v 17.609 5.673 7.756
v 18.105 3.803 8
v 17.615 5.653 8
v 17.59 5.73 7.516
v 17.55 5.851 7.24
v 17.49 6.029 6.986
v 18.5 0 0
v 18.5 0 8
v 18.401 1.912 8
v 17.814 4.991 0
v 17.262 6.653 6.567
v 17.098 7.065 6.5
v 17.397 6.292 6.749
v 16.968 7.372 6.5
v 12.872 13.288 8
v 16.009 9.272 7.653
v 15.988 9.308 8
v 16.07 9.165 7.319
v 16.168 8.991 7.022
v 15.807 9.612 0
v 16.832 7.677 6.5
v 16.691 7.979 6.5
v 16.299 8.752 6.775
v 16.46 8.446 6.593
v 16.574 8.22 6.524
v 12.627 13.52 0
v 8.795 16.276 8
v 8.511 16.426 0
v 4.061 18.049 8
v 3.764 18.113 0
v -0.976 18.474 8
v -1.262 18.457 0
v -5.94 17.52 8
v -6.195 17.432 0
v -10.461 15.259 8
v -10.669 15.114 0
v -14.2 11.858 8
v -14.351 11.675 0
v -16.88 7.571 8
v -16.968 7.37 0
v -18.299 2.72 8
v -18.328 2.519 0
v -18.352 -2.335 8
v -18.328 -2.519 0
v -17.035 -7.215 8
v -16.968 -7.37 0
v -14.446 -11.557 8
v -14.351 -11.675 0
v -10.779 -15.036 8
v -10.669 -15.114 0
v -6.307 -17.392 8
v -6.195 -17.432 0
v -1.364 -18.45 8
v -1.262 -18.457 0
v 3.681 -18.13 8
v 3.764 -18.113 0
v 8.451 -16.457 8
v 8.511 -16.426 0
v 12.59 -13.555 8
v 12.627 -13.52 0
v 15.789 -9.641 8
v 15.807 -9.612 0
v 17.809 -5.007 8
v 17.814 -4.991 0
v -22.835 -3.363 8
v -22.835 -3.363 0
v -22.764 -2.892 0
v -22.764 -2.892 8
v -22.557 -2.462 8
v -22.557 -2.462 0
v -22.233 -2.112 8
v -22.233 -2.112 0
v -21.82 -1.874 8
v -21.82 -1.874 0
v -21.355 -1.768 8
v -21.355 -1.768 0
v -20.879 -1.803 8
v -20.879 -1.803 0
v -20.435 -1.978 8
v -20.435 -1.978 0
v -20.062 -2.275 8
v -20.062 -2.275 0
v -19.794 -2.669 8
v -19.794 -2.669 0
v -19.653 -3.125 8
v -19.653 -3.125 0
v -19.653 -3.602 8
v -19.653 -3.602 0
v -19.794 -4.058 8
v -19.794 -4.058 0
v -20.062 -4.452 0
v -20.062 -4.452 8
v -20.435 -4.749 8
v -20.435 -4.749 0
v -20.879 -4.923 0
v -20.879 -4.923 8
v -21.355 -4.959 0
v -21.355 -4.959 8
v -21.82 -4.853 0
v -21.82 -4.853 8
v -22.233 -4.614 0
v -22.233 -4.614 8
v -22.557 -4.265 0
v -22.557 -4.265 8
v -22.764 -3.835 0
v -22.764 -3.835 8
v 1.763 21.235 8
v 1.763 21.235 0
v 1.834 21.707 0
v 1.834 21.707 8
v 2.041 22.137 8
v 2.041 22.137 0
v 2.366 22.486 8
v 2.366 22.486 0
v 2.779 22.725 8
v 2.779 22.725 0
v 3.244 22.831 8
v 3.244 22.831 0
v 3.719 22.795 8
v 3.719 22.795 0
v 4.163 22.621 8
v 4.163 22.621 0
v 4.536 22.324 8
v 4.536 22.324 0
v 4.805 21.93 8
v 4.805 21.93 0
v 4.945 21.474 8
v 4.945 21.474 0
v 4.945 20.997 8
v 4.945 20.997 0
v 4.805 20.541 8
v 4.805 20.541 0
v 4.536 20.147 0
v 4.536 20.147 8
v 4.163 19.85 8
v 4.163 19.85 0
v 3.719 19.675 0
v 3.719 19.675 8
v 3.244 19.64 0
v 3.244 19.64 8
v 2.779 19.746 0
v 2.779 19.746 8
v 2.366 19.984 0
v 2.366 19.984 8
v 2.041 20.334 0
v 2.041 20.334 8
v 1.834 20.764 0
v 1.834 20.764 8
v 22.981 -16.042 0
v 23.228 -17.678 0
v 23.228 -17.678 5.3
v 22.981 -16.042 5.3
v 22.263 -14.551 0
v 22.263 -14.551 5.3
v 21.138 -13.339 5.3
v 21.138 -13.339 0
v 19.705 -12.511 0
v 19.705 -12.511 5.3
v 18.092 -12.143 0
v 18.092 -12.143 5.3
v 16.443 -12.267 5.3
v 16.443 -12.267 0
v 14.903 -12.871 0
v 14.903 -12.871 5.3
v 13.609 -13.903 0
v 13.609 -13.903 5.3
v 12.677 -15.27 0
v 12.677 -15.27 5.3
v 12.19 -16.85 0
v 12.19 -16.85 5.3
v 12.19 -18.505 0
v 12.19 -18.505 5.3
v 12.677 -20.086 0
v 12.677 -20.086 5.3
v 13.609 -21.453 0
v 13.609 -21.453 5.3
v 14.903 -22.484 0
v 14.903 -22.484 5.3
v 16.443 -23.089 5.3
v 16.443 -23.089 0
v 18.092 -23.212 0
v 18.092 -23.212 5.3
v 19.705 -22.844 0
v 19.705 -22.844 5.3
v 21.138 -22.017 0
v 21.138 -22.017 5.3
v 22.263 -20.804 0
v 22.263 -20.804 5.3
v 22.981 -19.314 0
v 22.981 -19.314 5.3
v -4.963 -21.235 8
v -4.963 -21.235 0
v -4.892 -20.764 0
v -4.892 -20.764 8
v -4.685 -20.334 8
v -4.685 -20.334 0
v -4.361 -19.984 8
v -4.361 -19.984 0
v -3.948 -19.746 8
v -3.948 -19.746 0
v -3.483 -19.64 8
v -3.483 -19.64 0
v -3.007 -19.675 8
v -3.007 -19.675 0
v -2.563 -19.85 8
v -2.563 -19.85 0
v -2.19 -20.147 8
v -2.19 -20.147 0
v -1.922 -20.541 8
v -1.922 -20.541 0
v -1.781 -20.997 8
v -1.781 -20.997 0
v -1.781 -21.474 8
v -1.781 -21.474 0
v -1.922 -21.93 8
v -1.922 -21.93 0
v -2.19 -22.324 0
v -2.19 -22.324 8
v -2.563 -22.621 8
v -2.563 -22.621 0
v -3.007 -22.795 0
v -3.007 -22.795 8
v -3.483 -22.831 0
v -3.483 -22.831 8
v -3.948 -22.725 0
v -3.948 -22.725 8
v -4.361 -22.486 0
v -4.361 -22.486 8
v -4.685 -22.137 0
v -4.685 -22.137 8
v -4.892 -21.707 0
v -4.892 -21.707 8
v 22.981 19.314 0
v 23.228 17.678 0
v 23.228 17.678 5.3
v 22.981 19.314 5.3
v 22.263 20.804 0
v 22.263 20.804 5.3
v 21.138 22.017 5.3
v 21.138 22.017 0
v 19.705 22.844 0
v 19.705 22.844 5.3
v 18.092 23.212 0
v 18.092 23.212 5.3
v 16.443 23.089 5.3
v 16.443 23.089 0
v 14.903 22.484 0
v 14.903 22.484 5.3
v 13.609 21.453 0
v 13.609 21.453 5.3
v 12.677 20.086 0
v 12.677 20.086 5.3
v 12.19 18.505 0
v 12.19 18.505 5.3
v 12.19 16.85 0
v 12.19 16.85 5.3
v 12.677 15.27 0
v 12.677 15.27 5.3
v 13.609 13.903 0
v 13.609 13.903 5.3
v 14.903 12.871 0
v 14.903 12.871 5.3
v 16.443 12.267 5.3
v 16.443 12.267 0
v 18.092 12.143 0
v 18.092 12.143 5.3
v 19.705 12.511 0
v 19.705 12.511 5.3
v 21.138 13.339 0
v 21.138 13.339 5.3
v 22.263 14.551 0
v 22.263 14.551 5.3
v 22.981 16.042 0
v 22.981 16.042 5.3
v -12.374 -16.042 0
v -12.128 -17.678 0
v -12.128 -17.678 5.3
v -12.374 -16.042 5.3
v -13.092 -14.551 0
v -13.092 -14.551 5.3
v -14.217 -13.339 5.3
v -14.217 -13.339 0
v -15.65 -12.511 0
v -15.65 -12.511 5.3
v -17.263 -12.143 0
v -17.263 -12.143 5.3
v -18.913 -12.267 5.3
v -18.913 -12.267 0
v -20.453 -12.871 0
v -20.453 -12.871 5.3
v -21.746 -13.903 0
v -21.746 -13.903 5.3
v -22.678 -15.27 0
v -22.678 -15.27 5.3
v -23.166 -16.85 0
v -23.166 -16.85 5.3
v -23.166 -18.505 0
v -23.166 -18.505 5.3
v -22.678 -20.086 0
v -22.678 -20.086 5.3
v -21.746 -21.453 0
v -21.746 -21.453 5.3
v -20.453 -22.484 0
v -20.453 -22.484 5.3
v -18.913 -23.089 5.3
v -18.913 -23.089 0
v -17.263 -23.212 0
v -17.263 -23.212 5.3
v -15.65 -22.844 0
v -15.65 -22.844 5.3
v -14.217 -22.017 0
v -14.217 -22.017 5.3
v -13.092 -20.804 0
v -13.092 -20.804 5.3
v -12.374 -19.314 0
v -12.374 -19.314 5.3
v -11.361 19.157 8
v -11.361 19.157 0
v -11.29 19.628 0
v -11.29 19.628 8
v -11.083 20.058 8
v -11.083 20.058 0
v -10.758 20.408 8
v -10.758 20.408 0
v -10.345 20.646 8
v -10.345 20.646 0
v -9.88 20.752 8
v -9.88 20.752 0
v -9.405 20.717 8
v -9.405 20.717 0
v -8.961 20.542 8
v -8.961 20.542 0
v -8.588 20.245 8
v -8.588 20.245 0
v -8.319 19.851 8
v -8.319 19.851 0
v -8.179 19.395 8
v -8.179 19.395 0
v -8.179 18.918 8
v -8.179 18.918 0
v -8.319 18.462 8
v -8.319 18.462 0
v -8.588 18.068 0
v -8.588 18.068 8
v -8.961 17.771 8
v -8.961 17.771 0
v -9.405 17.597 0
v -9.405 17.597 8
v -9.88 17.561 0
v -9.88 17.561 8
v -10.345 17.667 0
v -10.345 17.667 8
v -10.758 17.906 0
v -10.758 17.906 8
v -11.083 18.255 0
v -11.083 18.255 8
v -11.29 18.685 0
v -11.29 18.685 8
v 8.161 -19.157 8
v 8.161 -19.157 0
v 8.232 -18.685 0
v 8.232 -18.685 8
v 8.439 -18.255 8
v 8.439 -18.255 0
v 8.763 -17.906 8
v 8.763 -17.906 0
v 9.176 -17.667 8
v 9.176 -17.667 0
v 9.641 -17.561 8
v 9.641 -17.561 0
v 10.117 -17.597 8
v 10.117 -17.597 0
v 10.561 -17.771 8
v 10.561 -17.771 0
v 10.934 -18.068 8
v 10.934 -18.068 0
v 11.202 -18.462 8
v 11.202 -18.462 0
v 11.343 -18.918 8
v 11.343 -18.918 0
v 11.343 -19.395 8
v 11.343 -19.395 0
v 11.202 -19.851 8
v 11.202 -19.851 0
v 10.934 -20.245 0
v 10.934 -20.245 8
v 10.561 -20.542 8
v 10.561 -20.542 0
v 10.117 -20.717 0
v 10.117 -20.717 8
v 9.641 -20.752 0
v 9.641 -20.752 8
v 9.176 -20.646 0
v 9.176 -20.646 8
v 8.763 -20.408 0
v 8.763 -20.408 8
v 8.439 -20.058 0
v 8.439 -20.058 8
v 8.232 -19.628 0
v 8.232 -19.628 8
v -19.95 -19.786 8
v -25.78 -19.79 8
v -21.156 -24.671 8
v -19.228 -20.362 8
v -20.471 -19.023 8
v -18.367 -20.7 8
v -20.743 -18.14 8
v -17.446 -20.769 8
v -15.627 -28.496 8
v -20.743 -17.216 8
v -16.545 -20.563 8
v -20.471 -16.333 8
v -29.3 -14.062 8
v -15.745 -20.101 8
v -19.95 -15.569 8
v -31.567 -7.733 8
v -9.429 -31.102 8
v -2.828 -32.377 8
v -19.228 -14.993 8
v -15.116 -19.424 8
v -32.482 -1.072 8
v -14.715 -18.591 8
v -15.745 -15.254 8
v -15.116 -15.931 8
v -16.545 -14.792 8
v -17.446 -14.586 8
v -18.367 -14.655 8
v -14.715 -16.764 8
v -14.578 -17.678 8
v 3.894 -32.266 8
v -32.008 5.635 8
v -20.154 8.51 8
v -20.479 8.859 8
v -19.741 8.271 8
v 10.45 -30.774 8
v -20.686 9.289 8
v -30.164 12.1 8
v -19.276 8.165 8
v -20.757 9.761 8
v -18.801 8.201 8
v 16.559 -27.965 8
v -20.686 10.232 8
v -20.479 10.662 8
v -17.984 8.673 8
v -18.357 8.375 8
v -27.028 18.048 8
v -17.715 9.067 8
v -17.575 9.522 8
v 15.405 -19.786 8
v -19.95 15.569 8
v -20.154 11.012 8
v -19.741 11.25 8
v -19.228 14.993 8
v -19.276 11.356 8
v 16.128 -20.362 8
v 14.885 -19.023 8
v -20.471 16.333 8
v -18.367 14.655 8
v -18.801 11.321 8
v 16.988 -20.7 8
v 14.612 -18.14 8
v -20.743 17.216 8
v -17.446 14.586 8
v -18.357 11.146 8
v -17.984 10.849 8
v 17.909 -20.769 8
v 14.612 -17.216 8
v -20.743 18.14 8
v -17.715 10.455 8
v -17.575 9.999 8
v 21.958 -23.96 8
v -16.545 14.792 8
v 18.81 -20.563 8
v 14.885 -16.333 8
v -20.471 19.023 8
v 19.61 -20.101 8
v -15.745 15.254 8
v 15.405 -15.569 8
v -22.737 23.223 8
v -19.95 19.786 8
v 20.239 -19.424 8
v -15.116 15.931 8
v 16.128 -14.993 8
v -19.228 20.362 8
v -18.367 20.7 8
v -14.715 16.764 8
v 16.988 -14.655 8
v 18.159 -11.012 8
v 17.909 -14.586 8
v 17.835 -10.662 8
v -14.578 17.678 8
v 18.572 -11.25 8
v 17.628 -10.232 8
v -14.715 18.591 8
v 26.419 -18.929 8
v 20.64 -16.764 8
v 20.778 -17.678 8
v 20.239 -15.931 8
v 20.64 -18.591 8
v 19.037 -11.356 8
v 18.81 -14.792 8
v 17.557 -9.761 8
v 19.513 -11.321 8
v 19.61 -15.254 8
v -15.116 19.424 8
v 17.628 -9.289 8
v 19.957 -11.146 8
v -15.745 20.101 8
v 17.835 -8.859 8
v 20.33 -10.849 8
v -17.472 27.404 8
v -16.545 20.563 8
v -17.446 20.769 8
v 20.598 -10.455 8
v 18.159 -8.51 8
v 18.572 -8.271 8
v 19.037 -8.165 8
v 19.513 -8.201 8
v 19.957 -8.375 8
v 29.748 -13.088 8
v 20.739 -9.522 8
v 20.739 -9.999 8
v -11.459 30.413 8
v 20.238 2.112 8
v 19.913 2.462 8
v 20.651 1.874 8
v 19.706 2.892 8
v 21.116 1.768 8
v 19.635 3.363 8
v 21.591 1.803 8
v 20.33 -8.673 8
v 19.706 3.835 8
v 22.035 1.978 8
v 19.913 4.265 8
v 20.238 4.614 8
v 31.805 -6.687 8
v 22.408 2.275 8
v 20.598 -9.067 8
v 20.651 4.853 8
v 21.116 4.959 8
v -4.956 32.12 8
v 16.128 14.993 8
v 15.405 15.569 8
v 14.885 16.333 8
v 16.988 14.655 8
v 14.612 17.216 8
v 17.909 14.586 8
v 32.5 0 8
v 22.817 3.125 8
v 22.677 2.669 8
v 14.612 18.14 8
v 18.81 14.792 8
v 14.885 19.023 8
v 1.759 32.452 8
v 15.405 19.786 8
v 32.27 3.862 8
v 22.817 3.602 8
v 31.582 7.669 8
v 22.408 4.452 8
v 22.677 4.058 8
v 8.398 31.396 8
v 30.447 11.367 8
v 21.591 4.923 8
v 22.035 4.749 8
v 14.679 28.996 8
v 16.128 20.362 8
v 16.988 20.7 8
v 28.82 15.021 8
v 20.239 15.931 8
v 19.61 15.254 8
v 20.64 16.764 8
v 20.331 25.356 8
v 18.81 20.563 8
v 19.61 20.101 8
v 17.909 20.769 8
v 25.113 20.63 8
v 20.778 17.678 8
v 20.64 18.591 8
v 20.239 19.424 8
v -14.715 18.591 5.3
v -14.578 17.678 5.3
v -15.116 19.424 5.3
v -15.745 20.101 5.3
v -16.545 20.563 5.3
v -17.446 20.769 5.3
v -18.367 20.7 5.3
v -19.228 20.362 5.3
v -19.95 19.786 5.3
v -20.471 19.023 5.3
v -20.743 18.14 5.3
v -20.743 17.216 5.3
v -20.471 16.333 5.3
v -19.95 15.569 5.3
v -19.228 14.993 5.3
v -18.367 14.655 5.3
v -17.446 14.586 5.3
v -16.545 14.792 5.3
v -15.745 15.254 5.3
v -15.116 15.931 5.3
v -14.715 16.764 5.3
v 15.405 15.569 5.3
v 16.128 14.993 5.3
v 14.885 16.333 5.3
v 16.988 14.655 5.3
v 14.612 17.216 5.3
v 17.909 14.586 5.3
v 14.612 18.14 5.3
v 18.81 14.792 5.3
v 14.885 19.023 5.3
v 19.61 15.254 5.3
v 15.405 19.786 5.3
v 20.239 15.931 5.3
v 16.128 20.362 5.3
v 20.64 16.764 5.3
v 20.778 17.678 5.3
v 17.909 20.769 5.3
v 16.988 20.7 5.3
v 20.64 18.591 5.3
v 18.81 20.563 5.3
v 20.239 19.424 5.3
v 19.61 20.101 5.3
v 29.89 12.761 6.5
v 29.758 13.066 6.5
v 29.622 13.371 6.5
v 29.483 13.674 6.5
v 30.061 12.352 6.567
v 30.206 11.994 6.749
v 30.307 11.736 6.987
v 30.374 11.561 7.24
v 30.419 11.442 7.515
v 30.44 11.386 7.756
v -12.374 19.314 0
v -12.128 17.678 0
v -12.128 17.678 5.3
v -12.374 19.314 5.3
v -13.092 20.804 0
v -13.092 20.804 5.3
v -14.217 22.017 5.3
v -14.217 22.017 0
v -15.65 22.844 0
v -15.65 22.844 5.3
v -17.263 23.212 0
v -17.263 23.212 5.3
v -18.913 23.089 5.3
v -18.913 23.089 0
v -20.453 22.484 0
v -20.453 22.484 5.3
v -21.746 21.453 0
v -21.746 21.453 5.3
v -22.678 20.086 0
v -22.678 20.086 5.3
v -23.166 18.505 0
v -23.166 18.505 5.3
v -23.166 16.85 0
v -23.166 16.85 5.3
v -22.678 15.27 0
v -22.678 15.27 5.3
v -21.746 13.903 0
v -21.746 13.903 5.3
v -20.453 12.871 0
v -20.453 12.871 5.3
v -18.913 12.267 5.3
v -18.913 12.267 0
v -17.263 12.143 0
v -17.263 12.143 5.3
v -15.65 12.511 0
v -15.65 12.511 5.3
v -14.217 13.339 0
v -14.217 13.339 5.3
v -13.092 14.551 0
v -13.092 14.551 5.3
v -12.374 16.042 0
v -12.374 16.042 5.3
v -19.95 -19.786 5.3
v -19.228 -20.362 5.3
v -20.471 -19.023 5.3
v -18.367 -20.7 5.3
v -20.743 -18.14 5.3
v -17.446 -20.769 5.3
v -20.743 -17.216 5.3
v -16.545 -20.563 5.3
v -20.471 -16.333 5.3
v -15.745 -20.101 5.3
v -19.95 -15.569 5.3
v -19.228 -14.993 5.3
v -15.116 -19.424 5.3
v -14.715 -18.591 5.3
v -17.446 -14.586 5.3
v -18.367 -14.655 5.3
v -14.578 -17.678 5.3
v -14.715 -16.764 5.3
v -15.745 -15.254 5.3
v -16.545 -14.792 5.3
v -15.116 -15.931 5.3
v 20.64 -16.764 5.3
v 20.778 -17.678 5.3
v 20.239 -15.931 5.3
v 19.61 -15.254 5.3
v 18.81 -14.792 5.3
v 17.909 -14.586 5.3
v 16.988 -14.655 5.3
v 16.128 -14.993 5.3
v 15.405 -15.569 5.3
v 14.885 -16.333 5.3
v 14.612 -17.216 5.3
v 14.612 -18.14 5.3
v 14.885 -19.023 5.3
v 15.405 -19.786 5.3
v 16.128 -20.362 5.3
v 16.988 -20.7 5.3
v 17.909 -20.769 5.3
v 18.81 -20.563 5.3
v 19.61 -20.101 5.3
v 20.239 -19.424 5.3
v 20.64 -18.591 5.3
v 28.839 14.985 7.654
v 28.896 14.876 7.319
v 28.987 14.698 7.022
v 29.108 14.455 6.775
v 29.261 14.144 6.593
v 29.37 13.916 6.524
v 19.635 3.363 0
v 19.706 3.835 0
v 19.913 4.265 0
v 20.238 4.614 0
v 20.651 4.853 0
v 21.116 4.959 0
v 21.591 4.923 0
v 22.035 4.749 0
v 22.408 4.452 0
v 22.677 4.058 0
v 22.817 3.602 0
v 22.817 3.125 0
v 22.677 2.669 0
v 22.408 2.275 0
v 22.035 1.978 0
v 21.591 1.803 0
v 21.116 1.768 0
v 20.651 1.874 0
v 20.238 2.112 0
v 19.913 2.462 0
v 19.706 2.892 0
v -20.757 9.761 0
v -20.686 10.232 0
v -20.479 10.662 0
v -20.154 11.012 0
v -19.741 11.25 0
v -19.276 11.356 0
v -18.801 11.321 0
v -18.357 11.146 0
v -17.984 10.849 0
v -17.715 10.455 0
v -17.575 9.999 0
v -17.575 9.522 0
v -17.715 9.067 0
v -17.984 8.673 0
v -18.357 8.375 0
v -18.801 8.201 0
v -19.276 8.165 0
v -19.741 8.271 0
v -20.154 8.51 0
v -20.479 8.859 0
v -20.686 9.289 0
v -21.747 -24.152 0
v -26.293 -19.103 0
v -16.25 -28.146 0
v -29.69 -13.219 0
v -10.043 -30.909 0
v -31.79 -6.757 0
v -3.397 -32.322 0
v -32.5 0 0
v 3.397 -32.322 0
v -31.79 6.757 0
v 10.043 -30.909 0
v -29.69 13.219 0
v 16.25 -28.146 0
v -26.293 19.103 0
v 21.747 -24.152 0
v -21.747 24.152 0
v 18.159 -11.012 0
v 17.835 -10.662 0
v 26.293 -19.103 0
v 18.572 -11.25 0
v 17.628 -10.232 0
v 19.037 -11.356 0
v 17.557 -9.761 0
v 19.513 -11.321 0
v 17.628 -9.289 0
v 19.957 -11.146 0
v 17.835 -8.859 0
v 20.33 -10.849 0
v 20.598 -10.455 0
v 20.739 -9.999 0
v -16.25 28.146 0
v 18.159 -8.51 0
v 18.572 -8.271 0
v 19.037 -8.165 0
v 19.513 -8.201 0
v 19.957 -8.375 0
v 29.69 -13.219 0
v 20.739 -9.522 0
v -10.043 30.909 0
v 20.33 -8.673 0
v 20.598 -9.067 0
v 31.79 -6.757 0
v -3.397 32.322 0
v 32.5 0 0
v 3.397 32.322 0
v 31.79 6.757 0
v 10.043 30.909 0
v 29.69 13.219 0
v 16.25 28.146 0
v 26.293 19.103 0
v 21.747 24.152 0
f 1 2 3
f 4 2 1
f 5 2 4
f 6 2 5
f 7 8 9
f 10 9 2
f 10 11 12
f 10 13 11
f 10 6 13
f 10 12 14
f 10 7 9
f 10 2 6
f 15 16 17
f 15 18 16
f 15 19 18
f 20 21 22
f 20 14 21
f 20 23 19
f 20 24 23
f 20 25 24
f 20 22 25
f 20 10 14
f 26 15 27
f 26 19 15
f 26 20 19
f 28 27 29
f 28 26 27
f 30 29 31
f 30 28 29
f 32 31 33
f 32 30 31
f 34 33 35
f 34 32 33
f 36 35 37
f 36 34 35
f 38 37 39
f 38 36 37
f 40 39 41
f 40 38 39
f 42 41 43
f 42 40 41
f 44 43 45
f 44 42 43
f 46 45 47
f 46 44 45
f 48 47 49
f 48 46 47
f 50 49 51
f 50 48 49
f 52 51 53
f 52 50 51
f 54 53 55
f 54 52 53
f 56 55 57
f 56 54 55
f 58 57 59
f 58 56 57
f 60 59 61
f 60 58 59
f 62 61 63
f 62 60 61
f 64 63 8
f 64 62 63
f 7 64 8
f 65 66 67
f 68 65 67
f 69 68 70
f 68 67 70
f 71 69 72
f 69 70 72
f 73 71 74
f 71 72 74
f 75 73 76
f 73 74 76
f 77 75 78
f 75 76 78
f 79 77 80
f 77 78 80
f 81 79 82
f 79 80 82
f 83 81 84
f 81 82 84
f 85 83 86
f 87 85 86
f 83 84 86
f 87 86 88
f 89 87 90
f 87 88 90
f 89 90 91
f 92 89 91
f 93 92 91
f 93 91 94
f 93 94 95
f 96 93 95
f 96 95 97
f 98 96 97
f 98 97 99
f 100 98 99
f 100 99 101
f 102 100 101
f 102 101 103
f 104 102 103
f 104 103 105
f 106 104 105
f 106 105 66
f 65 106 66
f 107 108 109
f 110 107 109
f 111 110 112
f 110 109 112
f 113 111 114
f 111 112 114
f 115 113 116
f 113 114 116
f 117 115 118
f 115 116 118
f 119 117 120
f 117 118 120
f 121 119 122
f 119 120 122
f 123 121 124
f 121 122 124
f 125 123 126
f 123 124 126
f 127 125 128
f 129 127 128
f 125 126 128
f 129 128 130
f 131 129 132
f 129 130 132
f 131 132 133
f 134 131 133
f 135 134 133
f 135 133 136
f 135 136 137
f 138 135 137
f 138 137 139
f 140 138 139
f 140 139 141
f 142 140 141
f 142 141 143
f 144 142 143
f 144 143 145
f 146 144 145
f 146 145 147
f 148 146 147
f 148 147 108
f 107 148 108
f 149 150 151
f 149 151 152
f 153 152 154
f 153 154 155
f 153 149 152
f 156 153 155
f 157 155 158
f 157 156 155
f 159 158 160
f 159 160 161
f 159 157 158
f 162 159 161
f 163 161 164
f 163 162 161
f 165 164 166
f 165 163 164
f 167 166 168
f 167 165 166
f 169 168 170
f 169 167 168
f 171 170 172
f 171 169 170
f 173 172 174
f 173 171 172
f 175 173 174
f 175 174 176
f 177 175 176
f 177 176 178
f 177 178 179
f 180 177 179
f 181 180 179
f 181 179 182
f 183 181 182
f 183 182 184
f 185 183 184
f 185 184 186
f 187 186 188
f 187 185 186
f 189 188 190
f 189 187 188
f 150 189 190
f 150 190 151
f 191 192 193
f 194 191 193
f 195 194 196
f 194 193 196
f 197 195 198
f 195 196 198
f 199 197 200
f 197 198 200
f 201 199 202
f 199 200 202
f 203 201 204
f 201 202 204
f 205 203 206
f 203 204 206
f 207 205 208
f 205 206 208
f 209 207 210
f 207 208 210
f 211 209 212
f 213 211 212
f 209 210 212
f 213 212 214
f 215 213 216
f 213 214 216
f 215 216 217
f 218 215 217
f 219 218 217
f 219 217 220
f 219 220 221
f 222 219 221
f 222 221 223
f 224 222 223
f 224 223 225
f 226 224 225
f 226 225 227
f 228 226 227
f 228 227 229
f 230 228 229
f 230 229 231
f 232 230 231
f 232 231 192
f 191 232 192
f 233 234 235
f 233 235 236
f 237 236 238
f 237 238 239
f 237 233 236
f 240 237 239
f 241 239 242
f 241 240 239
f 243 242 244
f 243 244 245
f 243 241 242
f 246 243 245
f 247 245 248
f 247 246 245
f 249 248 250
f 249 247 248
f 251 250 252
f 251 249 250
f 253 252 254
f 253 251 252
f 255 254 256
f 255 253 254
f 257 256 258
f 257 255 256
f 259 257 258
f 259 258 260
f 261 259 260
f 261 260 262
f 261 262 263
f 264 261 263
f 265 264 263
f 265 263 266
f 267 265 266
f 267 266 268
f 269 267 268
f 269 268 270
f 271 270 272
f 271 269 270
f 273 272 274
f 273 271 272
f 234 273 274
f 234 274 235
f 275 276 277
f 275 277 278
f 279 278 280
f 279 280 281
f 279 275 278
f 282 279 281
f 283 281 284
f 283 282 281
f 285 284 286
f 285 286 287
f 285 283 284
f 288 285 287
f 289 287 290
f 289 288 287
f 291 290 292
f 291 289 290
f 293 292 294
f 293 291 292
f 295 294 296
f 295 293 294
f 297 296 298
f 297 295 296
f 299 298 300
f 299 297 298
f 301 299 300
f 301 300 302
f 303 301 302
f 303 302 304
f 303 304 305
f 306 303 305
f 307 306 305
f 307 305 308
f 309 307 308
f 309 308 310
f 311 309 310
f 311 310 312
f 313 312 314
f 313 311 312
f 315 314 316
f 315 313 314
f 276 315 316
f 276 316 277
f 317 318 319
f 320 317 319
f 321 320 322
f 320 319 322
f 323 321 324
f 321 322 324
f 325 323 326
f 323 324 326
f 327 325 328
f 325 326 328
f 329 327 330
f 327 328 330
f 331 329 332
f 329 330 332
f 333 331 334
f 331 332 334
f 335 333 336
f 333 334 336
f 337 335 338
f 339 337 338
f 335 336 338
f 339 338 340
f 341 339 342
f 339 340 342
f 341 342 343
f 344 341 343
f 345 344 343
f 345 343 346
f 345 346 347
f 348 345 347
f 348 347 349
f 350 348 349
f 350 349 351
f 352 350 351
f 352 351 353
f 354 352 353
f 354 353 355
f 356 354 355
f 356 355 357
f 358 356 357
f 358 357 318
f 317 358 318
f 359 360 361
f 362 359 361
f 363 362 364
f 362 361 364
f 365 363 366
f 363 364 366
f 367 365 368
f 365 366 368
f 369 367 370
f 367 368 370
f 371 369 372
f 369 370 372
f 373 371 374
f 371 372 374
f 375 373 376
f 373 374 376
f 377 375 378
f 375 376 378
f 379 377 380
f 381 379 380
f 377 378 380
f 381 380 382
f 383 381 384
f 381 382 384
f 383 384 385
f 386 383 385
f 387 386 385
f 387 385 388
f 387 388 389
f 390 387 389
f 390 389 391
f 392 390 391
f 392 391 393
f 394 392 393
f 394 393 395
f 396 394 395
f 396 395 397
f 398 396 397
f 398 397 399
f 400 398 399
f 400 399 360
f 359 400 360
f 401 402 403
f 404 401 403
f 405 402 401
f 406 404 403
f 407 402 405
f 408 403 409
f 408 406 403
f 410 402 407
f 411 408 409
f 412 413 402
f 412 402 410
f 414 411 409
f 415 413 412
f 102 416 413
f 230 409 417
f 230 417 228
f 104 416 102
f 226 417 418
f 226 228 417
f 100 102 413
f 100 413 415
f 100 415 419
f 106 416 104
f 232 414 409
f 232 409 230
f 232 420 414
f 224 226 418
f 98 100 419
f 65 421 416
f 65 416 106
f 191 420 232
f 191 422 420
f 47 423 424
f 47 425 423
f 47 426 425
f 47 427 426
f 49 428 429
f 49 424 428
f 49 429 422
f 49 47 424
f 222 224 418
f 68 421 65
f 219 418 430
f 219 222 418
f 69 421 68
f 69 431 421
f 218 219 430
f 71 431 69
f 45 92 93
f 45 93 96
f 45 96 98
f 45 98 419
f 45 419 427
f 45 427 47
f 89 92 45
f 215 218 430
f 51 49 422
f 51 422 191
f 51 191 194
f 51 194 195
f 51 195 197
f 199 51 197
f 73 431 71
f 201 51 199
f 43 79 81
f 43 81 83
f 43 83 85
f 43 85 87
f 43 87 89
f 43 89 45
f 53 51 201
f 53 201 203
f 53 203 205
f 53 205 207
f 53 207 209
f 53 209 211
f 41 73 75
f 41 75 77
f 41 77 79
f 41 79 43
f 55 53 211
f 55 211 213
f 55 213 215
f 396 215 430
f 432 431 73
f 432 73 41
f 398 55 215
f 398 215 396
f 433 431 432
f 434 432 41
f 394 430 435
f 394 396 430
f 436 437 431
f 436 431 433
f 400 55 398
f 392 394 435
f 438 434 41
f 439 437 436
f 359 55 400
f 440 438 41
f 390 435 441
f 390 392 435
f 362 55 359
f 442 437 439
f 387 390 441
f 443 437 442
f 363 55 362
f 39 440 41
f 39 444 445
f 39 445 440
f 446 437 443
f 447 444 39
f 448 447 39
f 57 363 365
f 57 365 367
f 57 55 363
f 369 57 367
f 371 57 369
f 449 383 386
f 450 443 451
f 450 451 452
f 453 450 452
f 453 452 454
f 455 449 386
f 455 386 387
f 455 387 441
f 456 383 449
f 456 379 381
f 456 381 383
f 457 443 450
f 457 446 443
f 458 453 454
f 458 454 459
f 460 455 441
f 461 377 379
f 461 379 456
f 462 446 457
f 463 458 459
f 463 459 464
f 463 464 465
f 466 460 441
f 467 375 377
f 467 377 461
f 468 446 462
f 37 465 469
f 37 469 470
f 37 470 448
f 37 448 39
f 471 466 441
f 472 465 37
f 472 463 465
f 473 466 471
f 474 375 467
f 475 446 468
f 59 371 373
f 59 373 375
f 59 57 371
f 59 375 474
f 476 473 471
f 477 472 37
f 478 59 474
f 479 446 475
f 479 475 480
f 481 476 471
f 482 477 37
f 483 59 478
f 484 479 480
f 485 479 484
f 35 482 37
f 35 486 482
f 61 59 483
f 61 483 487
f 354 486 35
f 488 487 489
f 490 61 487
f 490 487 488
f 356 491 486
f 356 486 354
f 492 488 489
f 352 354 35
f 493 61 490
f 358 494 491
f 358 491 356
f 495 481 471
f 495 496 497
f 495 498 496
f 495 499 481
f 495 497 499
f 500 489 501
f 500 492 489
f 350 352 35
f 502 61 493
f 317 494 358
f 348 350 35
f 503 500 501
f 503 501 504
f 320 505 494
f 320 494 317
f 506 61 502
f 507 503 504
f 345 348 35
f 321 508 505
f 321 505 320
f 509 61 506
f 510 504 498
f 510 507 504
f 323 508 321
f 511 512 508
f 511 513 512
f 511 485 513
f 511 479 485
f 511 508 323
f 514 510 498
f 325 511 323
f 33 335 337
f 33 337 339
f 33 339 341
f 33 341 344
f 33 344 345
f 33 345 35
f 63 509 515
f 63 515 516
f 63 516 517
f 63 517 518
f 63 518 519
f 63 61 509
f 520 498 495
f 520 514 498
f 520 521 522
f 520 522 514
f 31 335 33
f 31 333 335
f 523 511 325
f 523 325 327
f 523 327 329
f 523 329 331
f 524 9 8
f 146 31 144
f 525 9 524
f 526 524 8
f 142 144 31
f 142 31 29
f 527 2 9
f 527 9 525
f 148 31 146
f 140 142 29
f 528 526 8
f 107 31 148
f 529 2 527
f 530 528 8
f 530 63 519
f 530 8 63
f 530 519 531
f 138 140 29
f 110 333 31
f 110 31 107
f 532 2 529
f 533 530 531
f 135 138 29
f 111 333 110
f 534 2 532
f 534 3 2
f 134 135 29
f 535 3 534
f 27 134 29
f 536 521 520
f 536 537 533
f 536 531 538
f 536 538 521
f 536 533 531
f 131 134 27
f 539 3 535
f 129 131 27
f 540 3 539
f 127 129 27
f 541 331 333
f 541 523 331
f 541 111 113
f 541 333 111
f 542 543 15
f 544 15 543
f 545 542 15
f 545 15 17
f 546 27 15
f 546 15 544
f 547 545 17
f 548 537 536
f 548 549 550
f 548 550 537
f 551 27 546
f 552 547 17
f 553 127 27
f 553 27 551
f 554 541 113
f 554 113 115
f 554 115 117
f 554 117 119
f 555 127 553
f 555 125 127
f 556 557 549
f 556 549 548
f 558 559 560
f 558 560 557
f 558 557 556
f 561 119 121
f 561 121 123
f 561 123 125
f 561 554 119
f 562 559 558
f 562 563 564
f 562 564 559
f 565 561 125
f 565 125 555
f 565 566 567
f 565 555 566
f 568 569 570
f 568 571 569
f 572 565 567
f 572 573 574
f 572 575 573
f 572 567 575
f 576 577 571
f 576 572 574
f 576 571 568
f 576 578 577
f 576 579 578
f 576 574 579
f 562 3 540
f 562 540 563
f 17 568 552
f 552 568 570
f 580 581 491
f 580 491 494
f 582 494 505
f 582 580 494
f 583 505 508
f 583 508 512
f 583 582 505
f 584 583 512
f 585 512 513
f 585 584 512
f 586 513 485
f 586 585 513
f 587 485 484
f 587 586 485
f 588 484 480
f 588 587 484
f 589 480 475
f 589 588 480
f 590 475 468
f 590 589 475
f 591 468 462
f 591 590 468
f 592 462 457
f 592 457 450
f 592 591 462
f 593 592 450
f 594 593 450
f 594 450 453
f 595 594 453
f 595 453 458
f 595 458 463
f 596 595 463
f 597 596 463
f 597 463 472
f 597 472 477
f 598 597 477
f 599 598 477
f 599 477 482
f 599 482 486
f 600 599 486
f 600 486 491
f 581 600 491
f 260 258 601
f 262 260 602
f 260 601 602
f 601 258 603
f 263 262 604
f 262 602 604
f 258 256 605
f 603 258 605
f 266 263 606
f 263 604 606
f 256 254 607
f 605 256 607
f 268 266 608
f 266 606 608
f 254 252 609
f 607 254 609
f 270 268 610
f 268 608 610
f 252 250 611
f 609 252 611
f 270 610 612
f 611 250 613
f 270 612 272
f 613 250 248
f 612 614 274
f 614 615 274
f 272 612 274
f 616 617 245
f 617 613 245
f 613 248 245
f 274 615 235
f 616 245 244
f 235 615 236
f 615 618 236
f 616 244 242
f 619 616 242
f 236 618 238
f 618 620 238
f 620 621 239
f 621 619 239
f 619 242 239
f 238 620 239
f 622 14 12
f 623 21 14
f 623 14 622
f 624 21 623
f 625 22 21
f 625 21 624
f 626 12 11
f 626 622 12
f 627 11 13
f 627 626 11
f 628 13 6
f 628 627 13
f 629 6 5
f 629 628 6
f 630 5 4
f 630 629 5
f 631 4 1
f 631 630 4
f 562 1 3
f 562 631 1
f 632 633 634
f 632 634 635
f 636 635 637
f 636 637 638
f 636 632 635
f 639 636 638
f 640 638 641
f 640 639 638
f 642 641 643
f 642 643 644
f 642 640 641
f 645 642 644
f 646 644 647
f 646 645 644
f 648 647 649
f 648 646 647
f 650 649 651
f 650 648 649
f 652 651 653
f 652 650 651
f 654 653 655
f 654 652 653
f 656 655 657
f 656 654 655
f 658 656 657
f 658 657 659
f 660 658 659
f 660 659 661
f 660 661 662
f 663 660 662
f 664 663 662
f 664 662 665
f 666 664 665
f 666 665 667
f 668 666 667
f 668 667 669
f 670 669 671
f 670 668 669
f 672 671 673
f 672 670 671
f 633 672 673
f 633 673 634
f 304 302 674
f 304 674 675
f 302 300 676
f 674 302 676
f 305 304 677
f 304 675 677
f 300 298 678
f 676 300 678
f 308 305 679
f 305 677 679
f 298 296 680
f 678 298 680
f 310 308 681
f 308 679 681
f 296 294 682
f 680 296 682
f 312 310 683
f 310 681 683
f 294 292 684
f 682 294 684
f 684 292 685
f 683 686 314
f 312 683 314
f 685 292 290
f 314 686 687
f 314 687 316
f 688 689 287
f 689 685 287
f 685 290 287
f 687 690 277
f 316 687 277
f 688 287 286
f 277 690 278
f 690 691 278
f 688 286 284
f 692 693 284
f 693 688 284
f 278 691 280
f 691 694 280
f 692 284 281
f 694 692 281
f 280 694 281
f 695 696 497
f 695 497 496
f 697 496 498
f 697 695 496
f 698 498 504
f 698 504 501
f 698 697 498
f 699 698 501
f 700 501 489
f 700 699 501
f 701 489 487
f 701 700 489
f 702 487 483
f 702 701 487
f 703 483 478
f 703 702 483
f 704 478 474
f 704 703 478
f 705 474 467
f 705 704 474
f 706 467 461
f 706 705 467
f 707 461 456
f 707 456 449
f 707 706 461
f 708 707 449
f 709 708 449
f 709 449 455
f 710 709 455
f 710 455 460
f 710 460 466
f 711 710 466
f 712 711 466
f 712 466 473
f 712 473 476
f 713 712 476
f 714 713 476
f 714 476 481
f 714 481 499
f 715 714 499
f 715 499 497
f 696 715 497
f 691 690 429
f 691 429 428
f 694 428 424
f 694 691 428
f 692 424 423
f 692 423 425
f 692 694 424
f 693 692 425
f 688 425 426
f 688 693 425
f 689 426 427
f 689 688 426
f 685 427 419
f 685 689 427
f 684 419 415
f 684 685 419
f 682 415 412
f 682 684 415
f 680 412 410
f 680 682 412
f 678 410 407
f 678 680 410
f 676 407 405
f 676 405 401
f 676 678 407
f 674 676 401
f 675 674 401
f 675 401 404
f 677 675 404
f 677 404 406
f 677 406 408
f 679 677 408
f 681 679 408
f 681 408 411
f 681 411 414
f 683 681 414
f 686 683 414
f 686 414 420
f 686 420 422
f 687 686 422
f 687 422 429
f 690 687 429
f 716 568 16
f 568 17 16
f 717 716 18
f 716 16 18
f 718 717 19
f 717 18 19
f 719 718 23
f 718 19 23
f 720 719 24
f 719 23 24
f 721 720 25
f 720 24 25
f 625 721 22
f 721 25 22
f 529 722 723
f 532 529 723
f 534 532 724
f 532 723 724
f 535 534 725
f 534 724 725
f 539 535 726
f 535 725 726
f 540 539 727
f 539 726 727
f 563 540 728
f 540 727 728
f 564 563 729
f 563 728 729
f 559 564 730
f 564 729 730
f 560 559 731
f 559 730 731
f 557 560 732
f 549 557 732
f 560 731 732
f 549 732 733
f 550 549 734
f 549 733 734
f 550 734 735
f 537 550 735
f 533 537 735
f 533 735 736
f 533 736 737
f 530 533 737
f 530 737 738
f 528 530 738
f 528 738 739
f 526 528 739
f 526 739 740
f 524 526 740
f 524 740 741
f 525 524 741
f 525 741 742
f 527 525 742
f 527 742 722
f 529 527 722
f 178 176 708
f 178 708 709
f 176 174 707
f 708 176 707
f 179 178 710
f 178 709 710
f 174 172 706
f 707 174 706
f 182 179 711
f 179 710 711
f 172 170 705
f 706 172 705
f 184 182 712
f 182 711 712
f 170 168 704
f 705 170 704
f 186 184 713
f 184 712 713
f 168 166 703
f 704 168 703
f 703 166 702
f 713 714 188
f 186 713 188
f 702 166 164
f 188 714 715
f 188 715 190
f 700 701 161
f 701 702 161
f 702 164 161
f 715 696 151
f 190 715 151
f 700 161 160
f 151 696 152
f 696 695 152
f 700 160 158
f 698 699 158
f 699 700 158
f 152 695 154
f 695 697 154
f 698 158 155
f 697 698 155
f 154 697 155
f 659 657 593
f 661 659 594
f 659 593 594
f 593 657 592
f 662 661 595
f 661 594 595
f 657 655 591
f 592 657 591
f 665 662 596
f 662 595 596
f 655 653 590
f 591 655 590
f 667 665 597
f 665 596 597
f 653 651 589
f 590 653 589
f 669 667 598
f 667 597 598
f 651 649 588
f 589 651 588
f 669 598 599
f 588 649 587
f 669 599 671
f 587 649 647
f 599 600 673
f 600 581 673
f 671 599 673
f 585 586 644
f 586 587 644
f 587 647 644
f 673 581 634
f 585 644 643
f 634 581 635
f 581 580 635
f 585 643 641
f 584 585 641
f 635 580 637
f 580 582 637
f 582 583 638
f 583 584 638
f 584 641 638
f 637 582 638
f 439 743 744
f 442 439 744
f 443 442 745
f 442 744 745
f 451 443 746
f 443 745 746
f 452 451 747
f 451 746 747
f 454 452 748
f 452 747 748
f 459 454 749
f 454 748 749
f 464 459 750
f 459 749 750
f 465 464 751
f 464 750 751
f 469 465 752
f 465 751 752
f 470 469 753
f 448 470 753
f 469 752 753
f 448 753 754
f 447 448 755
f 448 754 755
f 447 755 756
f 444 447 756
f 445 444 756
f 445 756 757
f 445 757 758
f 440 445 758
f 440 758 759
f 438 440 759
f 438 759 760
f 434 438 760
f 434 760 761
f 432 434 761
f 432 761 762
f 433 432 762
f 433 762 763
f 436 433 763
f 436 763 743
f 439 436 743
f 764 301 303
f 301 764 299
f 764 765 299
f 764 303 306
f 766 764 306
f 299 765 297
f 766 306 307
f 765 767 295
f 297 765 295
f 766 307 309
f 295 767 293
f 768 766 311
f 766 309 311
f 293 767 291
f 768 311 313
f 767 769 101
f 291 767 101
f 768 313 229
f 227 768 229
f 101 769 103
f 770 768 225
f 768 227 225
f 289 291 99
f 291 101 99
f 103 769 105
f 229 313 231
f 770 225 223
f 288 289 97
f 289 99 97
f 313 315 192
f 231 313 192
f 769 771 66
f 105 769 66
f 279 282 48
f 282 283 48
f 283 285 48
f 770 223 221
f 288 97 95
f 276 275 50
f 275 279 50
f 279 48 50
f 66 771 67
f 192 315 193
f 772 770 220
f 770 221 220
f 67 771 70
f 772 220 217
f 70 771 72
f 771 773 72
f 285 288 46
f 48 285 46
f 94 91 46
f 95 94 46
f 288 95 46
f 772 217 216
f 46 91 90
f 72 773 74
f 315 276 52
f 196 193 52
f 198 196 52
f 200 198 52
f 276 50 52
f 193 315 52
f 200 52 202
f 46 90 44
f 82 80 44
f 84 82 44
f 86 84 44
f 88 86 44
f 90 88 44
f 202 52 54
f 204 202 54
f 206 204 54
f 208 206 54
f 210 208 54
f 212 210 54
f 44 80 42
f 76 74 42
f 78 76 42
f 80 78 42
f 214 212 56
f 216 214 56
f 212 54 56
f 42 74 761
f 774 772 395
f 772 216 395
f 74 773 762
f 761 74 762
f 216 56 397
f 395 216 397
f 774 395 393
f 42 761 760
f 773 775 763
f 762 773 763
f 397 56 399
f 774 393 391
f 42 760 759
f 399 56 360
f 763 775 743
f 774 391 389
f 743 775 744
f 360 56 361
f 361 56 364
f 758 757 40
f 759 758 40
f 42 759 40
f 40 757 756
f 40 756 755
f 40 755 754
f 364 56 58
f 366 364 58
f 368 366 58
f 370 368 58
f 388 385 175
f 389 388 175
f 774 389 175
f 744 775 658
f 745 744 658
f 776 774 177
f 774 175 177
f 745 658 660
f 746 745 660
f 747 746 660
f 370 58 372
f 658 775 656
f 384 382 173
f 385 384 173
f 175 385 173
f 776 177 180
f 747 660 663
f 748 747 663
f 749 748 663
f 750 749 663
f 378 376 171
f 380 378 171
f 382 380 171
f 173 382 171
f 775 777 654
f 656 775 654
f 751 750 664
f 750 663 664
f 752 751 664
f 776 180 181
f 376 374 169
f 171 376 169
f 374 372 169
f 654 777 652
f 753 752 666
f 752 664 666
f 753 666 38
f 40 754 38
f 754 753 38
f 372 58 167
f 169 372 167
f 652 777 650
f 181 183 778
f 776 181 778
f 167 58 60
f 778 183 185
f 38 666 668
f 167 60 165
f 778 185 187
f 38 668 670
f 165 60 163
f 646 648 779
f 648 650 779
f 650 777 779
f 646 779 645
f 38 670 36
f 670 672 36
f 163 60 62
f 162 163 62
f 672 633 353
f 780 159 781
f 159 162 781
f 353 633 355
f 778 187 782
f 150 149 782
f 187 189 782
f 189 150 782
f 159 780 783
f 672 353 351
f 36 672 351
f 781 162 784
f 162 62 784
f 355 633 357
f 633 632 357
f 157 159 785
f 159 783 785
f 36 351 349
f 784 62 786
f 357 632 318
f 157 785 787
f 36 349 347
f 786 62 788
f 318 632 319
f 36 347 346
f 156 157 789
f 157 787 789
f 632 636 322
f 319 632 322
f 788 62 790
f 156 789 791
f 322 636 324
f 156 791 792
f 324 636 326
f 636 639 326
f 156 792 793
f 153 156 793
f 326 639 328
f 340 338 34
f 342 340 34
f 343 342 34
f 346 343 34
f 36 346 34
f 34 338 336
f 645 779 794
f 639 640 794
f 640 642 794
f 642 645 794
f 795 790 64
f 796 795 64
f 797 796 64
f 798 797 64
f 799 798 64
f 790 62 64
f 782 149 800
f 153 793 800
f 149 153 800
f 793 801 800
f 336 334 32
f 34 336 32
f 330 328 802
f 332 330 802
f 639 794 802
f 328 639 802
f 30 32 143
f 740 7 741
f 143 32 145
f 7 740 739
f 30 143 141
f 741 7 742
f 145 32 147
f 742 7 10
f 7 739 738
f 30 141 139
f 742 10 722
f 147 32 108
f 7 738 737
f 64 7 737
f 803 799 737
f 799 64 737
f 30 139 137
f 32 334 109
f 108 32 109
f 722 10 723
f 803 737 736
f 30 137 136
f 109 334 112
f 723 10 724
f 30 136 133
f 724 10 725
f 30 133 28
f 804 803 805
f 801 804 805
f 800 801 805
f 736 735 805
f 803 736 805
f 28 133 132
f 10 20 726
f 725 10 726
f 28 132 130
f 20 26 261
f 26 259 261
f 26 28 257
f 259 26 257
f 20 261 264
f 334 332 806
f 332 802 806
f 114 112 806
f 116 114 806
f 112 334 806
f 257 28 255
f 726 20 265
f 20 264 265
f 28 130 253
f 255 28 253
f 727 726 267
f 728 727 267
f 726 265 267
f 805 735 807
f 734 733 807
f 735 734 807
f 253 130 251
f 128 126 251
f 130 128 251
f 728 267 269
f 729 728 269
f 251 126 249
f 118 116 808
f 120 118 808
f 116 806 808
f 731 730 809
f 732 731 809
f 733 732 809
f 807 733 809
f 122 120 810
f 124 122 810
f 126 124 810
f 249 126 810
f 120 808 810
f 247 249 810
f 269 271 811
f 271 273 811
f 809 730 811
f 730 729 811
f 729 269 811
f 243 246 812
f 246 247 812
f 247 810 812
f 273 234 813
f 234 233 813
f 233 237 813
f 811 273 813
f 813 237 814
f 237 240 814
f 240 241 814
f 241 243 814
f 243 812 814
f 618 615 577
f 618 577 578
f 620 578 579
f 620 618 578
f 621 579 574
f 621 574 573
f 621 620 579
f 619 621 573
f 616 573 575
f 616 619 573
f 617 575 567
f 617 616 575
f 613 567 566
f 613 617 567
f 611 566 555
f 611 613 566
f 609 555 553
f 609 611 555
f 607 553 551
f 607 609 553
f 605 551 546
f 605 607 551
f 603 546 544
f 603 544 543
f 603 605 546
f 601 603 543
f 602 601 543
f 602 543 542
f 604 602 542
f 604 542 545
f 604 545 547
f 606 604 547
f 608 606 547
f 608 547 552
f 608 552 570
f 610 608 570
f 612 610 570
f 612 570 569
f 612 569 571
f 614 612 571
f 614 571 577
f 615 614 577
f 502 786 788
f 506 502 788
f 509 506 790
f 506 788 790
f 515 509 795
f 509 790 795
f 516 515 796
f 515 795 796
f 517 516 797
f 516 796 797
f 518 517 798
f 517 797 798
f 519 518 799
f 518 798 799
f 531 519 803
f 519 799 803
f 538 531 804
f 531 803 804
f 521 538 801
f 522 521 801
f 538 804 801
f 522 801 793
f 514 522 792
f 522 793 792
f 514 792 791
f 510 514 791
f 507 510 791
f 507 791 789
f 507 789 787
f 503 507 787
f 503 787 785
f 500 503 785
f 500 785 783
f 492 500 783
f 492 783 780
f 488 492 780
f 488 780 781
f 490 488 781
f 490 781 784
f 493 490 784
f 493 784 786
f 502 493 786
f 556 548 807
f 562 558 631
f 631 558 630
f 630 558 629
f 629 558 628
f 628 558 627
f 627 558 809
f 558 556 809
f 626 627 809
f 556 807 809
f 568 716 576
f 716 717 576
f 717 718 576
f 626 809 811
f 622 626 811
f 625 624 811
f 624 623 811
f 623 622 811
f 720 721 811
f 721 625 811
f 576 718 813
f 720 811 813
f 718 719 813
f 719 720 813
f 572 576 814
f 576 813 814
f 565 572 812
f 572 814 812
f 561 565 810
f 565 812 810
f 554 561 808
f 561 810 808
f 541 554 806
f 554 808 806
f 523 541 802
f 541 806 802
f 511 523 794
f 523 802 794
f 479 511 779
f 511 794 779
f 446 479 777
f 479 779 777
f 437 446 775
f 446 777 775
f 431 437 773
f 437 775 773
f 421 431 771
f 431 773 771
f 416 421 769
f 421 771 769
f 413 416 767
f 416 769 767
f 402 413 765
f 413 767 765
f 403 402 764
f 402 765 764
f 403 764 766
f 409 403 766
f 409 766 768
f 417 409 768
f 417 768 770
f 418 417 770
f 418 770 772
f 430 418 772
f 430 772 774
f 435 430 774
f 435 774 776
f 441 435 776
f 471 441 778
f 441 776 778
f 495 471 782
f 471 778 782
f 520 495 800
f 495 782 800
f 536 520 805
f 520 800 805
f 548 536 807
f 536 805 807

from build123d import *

# Parameters (mm, degrees)
SKETCH1_R           = 32.5
SKETCH1_R_2         = 3.1
SKETCH1_R_3         = 18.5
BOSS_EXTRUDE2_DEPTH = 8
SKETCH1_6_R         = 18.5
SKETCH1_6_R_2       = 5.55
SKETCH1_6_R_3       = 3.1
CUT_EXTRUDE2_DEPTH  = 5.3
SKETCH2_R           = 1.6
CUT_EXTRUDE3_DEPTH  = 10
CUT_EXTRUDE4_DEPTH  = 1.5
FILLET1_R           = 1.5


with BuildPart() as part:
    # Sketch1 → Boss-Extrude2 (new body)
    with BuildSketch(Plane.XY):
        Circle(SKETCH1_R)
        with Locations((17.67766953, 17.67766953)):
            Circle(SKETCH1_R_2, mode=Mode.SUBTRACT)
        with Locations((17.67766953, -17.67766953)):
            Circle(SKETCH1_R_2, mode=Mode.SUBTRACT)
        with Locations((-17.67766953, -17.67766953)):
            Circle(SKETCH1_R_2, mode=Mode.SUBTRACT)
        with Locations((-17.67766953, 17.67766953)):
            Circle(SKETCH1_R_2, mode=Mode.SUBTRACT)
        Circle(SKETCH1_R_3, mode=Mode.SUBTRACT)
    extrude(amount=BOSS_EXTRUDE2_DEPTH)

    # Sketch1<6> → Cut-Extrude2 (cut)
    # profile 1 of 8: a face of its own
    with BuildSketch(Plane.XY):
        Circle(SKETCH1_6_R)
    # profile 2 of 8: a face of its own
    with BuildSketch(Plane.XY):
        with Locations((17.67766953, 17.67766953)):
            Circle(SKETCH1_6_R_2)
        with Locations((17.67766953, 17.67766953)):
            Circle(SKETCH1_6_R_3, mode=Mode.SUBTRACT)
    # profile 3 of 8: a face of its own
    with BuildSketch(Plane.XY):
        Circle(SKETCH1_6_R)
    # profile 4 of 8: a face of its own
    with BuildSketch(Plane.XY):
        with Locations((17.67766953, -17.67766953)):
            Circle(SKETCH1_6_R_2)
        with Locations((17.67766953, -17.67766953)):
            Circle(SKETCH1_6_R_3, mode=Mode.SUBTRACT)
    # profile 5 of 8: a face of its own
    with BuildSketch(Plane.XY):
        Circle(SKETCH1_6_R)
    # profile 6 of 8: a face of its own
    with BuildSketch(Plane.XY):
        with Locations((-17.67766953, -17.67766953)):
            Circle(SKETCH1_6_R_2)
        with Locations((-17.67766953, -17.67766953)):
            Circle(SKETCH1_6_R_3, mode=Mode.SUBTRACT)
    # profile 7 of 8: a face of its own
    with BuildSketch(Plane.XY):
        Circle(SKETCH1_6_R)
    # profile 8 of 8: a face of its own
    with BuildSketch(Plane.XY):
        with Locations((-17.67766953, 17.67766953)):
            Circle(SKETCH1_6_R_2)
        with Locations((-17.67766953, 17.67766953)):
            Circle(SKETCH1_6_R_3, mode=Mode.SUBTRACT)
    extrude(amount=CUT_EXTRUDE2_DEPTH, mode=Mode.SUBTRACT)

    # Sketch2 → Cut-Extrude3 (cut)
    with BuildSketch(Plane(origin=(0, 0, 0), x_dir=(-1, 0, 0), z_dir=(0, 0, -1))):
        with Locations((9.760795744, 19.15664027)):
            Circle(SKETCH2_R)
        with Locations((19.15664027, 9.760795744)):
            Circle(SKETCH2_R)
        with Locations((21.235299323, -3.363340998)):
            Circle(SKETCH2_R)
        with Locations((3.363340998, -21.235299323)):
            Circle(SKETCH2_R)
        with Locations((-9.760795744, -19.15664027)):
            Circle(SKETCH2_R)
        with Locations((-19.15664027, -9.760795744)):
            Circle(SKETCH2_R)
        with Locations((-21.235299323, 3.363340998)):
            Circle(SKETCH2_R)
        with Locations((-3.363340998, 21.235299323)):
            Circle(SKETCH2_R)
    extrude(amount=-CUT_EXTRUDE3_DEPTH, mode=Mode.SUBTRACT)

    # Sketch4 → Cut-Extrude4 (cut)
    with BuildSketch(Plane.XY.offset(8)):
        Polygon((14.516655151, 4.273958731), (32.787564304, 12.408691592), (31.160617731, 16.062873423), (12.889708578, 7.928140561), align=None)
    extrude(amount=-CUT_EXTRUDE4_DEPTH, mode=Mode.SUBTRACT)

    # Fillet1
    fillet1_edges = [part.edges().sort_by_distance(p)[0] for p in [
        (22.404274162, 12.164298088, 6.5),
        (24.031220735, 8.510116257, 6.5),
    ]]
    fillet(fillet1_edges, radius=FILLET1_R - 0.0001)  # a hair under: the kernel refuses the full size


solid = part.part
